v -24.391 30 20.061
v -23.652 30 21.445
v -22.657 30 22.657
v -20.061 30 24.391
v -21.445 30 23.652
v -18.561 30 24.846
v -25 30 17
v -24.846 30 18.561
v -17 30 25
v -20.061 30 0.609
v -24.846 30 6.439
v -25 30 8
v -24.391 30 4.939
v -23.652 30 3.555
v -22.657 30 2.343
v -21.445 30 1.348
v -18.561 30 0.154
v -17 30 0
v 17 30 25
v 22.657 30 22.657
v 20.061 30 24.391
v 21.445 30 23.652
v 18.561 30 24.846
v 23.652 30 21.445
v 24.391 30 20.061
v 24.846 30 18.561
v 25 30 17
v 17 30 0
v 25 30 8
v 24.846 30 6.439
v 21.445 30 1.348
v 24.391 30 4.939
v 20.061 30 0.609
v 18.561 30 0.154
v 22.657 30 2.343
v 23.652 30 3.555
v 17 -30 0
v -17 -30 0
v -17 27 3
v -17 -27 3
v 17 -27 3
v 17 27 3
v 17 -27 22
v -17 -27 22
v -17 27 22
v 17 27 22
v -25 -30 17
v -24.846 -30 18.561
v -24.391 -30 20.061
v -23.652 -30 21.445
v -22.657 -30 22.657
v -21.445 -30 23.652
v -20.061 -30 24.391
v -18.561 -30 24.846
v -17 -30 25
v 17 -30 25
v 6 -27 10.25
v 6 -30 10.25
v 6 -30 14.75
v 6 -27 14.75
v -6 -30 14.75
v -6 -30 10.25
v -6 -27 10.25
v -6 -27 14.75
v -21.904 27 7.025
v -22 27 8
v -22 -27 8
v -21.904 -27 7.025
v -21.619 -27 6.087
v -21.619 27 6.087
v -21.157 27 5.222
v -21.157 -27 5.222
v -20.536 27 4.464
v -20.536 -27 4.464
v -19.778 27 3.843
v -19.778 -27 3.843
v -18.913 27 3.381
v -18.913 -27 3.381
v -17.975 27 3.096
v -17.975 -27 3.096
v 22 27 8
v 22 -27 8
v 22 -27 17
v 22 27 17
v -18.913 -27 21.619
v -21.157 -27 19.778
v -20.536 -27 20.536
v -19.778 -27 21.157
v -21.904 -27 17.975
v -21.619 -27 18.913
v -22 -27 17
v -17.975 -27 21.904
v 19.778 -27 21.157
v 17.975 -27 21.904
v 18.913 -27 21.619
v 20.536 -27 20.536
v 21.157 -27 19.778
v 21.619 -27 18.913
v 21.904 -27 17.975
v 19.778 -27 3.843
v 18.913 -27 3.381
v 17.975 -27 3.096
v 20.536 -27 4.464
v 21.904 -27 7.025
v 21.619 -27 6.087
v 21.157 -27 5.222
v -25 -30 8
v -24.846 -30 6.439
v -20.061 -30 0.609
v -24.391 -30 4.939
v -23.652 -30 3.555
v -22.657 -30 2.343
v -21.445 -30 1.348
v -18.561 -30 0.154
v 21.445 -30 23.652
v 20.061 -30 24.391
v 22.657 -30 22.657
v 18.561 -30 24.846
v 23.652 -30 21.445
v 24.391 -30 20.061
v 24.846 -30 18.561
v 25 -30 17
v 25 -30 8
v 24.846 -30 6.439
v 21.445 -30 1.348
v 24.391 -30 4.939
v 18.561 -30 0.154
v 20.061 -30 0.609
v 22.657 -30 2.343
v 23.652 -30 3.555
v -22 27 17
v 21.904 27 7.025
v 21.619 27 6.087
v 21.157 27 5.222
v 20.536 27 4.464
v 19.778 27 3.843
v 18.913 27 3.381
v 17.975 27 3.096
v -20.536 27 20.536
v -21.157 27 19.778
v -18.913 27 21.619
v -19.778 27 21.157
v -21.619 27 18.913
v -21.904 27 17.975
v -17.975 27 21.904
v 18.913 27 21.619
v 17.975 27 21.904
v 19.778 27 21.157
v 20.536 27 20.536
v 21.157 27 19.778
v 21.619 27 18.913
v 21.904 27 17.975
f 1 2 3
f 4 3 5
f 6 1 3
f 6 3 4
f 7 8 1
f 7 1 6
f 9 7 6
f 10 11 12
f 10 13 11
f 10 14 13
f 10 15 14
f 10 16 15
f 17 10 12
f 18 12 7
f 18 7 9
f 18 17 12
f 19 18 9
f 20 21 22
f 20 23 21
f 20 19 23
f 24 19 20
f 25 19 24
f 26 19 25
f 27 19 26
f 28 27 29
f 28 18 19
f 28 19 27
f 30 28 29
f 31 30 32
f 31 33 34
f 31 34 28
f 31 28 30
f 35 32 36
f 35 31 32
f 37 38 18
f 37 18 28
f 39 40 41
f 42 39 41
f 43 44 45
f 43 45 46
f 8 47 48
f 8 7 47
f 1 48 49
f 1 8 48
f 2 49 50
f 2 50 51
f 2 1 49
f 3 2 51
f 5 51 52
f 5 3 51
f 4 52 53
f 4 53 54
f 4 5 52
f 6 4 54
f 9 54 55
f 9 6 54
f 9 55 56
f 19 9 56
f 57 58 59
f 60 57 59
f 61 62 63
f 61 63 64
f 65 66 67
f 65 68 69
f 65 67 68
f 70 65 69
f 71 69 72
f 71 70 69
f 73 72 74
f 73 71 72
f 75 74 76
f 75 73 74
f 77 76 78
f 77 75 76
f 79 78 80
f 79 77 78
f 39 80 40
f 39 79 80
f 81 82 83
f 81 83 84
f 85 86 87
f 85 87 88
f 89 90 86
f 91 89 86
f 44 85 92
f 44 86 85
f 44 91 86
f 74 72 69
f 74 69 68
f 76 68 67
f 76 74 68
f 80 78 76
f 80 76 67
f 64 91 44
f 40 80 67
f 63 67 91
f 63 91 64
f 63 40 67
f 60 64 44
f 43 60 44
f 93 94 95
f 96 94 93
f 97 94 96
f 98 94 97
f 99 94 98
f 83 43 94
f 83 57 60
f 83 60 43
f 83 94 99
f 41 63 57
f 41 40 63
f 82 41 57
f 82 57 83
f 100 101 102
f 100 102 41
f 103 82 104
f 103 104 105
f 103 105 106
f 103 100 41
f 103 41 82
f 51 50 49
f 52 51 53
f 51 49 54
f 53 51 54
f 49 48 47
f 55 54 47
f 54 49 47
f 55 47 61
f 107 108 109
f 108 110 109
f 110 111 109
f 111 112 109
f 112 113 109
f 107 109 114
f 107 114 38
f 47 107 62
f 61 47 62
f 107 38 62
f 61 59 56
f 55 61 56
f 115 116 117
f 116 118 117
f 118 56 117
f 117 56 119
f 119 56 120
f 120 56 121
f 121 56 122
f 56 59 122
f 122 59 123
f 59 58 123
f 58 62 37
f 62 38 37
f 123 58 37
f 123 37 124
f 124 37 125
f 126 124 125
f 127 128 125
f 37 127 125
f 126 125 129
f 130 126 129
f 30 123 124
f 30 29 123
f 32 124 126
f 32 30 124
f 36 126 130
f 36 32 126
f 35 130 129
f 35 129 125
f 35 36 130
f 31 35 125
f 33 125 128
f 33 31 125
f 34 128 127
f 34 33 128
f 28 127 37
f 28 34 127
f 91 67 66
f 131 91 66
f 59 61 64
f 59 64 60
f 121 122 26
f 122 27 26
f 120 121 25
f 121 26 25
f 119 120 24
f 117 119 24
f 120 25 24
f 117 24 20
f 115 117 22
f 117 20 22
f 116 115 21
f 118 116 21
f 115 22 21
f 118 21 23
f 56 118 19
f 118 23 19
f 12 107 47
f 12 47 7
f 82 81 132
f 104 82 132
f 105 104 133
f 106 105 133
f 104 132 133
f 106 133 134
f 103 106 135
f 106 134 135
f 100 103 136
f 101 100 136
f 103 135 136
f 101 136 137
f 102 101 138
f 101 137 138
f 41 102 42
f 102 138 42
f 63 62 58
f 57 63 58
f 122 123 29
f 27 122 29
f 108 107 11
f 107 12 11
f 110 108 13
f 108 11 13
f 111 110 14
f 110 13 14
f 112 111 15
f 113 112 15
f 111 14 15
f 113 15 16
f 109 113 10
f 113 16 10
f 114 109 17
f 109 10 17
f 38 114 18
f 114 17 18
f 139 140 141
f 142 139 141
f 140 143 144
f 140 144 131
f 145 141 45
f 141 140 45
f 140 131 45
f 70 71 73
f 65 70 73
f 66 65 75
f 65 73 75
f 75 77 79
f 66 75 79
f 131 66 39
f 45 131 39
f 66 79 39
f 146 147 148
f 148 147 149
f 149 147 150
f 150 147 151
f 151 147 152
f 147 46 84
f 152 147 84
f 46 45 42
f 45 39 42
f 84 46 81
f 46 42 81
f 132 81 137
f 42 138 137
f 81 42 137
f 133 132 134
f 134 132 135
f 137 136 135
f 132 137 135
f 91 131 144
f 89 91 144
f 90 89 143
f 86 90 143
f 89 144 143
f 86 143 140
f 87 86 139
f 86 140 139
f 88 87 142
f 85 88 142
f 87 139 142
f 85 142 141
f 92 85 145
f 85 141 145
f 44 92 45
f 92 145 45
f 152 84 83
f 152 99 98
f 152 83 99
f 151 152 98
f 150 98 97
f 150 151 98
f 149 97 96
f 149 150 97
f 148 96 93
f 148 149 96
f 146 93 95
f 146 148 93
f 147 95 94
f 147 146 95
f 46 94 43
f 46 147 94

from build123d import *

# Parameters (mm, degrees)
F0_W     = 50
F0_H     = 60
F1_DEPTH = 25
F2_R     = 8
F3_T     = -3
F4_W     = 12
F4_H     = 4.5
F5_DEPTH = 3


with BuildPart() as f1:
    # F0 (on Top) → F1 (new body)
    with BuildSketch(Plane.XY):
        Rectangle(F0_W, F0_H)
    extrude(amount=F1_DEPTH)

    # F2
    f2_edges = [f1.edges().sort_by_distance(p)[0] for p in [
        (25, 0, 25),
        (25, 0, 0),
        (-25, 0, 0),
        (-25, 0, 25),
    ]]
    fillet(f2_edges, radius=F2_R)

    # F3 (hollow: no face is removed)
    offset(amount=F3_T, mode=Mode.SUBTRACT)

    # F4 (on face) → F5 (cut)
    with BuildSketch(Plane.XZ.offset(30)):
        with Locations((0, 12.5)):
            Rectangle(F4_W, F4_H)
    extrude(amount=-F5_DEPTH, mode=Mode.SUBTRACT)


solid = f1.part
